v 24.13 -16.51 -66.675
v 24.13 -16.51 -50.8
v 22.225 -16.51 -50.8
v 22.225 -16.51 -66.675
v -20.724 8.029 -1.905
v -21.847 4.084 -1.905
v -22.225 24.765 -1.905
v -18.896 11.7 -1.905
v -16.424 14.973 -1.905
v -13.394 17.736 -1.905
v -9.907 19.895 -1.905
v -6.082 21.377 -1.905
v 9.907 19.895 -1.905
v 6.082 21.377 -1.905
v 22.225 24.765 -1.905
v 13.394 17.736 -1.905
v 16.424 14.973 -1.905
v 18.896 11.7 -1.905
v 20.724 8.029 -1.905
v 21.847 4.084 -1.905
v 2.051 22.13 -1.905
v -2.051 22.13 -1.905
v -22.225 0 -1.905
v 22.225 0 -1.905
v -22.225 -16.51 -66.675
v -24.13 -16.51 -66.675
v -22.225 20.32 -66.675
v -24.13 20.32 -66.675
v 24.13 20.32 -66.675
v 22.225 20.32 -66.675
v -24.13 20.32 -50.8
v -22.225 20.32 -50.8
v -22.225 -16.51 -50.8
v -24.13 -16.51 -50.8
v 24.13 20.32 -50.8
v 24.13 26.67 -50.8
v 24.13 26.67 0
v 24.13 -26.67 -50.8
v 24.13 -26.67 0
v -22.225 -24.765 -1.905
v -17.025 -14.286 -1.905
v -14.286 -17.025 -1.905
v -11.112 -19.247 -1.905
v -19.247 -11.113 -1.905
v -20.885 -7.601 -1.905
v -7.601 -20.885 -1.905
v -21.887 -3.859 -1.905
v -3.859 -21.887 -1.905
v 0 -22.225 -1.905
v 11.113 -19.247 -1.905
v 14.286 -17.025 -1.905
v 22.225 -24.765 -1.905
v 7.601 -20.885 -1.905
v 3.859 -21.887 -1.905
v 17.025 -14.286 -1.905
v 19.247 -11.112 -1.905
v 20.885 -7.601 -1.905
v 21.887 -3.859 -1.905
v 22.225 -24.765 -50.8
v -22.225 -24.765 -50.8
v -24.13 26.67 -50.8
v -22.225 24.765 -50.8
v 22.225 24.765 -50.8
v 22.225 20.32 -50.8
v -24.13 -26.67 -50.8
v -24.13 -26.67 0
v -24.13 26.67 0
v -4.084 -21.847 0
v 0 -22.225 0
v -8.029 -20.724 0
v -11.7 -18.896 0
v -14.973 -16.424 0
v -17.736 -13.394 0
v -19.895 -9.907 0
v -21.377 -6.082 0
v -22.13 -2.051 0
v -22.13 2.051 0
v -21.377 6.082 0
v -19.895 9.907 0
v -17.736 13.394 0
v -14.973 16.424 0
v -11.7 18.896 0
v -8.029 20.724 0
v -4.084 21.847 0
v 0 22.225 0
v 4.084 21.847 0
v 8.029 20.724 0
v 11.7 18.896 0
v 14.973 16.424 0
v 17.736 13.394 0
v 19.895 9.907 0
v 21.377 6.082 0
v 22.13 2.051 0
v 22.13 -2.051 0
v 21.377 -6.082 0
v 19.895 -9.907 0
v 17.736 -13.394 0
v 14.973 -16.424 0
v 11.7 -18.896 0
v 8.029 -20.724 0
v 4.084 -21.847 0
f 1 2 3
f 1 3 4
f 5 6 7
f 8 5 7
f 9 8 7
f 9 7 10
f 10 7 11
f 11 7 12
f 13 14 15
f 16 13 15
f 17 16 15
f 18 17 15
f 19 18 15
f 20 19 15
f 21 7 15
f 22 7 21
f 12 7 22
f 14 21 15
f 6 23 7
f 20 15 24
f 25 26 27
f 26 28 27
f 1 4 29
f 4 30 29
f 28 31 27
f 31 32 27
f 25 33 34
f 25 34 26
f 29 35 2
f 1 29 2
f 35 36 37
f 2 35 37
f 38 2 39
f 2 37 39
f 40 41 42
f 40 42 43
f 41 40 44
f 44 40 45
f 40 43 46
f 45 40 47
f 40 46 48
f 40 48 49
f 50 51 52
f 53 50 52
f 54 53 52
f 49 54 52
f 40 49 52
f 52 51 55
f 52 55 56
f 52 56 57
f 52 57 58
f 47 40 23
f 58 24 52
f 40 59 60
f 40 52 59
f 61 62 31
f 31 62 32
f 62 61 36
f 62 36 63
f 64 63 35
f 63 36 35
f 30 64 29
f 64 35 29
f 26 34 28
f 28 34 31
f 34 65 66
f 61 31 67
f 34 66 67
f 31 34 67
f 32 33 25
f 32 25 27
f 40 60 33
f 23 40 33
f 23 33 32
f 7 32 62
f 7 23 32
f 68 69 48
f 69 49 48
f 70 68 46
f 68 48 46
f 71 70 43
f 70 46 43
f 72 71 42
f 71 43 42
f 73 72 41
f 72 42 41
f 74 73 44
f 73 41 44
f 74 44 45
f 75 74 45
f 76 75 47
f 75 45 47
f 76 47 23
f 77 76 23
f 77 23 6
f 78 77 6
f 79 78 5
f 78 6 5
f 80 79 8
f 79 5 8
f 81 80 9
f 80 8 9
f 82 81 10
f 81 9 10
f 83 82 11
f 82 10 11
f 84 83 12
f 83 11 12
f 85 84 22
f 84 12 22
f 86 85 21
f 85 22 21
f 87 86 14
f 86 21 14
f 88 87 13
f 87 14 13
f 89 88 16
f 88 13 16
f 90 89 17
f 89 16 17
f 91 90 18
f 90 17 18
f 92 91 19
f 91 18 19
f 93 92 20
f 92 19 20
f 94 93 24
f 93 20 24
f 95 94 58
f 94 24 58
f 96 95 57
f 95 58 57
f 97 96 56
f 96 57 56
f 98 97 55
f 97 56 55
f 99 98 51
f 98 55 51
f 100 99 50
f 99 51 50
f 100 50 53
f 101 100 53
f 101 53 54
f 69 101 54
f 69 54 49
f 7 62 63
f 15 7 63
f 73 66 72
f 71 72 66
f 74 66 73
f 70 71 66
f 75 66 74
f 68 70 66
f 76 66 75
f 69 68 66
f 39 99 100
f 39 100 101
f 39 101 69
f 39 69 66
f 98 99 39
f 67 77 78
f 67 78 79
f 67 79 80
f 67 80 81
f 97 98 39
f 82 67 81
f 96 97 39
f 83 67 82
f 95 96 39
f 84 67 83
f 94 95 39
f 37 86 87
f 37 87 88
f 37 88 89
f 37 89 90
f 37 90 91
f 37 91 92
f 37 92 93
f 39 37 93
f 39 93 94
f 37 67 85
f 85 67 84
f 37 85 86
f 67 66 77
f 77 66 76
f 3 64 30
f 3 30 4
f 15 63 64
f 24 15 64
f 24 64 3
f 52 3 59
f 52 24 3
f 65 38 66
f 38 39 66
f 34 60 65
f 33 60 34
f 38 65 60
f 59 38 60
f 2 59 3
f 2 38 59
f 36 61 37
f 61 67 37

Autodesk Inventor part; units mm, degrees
ref_plane "YZ Plane" through (0, 0, 0) normal (1, 0, 0) x (0, 1, 0)
ref_plane "XZ Plane" through (0, 0, 0) normal (0, 1, 0) x (-1, 0, 0)
ref_plane "XY Plane" through (0, 0, 0) normal (0, 0, 1) x (1, 0, 0)
sketch "Sketch1" plane through (0, 0, 0) normal (0, 0, 1) x (1, 0, 0)
  line L0 (24.13, -26.67) -> (-24.13, -26.67)
  line L1 (-24.13, -26.67) -> (-24.13, 26.67)
  line L2 (-24.13, 26.67) -> (24.13, 26.67)
  line L3 (24.13, 26.67) -> (24.13, -26.67)
  line L4 (0, 37.338) -> (0, -37.338) projected
  line L5 (-33.782, 0) -> (33.782, 0) projected
  dimension "d0" = 53.34
  dimension "d1" = 48.26
extrude "Extrusion1" add sketch "Sketch1" against normal blind 66.675
shell "Shell1" thickness 1.905 removed faces 1 at (-8.0433, 8.89, -66.675)
sketch "Sketch2" plane through (0, 0, 0) normal (0, 0, 1) x (1, 0, 0)
  point P0 (0, 0)
  point P1 (0, 0)
hole "Hole1" at (0, 0, 0) direction (0, 0, -1) diameter 44.45 end through all
sketch "Sketch3" plane through (24.13, -26.67, 0) normal (1, 0, 0) x (0, 0, -1)
  line L0 (0, 0) -> (66.675, 0) projected
  line L1 (50.8, 0) -> (50.8, 10.16)
  line L2 (50.8, 10.16) -> (66.675, 10.16)
  line L3 (66.675, 1.905) -> (66.675, 51.435) projected
  line L4 (0, 53.34) -> (66.675, 53.34) projected
  line L5 (50.8, 53.34) -> (50.8, 46.99)
  line L6 (50.8, 46.99) -> (66.675, 46.99)
  line L7 (66.675, 53.34) -> (66.675, 0) projected
  point P0 (0, 26.67)
  dimension "d12" = 10.16
  dimension "d13" = 6.35
  dimension "d14" = 15.875
extrude "Extrusion2" cut sketch "Sketch3" against normal up to next
properties part number "EStop Mount" material "PBT Plastic"
